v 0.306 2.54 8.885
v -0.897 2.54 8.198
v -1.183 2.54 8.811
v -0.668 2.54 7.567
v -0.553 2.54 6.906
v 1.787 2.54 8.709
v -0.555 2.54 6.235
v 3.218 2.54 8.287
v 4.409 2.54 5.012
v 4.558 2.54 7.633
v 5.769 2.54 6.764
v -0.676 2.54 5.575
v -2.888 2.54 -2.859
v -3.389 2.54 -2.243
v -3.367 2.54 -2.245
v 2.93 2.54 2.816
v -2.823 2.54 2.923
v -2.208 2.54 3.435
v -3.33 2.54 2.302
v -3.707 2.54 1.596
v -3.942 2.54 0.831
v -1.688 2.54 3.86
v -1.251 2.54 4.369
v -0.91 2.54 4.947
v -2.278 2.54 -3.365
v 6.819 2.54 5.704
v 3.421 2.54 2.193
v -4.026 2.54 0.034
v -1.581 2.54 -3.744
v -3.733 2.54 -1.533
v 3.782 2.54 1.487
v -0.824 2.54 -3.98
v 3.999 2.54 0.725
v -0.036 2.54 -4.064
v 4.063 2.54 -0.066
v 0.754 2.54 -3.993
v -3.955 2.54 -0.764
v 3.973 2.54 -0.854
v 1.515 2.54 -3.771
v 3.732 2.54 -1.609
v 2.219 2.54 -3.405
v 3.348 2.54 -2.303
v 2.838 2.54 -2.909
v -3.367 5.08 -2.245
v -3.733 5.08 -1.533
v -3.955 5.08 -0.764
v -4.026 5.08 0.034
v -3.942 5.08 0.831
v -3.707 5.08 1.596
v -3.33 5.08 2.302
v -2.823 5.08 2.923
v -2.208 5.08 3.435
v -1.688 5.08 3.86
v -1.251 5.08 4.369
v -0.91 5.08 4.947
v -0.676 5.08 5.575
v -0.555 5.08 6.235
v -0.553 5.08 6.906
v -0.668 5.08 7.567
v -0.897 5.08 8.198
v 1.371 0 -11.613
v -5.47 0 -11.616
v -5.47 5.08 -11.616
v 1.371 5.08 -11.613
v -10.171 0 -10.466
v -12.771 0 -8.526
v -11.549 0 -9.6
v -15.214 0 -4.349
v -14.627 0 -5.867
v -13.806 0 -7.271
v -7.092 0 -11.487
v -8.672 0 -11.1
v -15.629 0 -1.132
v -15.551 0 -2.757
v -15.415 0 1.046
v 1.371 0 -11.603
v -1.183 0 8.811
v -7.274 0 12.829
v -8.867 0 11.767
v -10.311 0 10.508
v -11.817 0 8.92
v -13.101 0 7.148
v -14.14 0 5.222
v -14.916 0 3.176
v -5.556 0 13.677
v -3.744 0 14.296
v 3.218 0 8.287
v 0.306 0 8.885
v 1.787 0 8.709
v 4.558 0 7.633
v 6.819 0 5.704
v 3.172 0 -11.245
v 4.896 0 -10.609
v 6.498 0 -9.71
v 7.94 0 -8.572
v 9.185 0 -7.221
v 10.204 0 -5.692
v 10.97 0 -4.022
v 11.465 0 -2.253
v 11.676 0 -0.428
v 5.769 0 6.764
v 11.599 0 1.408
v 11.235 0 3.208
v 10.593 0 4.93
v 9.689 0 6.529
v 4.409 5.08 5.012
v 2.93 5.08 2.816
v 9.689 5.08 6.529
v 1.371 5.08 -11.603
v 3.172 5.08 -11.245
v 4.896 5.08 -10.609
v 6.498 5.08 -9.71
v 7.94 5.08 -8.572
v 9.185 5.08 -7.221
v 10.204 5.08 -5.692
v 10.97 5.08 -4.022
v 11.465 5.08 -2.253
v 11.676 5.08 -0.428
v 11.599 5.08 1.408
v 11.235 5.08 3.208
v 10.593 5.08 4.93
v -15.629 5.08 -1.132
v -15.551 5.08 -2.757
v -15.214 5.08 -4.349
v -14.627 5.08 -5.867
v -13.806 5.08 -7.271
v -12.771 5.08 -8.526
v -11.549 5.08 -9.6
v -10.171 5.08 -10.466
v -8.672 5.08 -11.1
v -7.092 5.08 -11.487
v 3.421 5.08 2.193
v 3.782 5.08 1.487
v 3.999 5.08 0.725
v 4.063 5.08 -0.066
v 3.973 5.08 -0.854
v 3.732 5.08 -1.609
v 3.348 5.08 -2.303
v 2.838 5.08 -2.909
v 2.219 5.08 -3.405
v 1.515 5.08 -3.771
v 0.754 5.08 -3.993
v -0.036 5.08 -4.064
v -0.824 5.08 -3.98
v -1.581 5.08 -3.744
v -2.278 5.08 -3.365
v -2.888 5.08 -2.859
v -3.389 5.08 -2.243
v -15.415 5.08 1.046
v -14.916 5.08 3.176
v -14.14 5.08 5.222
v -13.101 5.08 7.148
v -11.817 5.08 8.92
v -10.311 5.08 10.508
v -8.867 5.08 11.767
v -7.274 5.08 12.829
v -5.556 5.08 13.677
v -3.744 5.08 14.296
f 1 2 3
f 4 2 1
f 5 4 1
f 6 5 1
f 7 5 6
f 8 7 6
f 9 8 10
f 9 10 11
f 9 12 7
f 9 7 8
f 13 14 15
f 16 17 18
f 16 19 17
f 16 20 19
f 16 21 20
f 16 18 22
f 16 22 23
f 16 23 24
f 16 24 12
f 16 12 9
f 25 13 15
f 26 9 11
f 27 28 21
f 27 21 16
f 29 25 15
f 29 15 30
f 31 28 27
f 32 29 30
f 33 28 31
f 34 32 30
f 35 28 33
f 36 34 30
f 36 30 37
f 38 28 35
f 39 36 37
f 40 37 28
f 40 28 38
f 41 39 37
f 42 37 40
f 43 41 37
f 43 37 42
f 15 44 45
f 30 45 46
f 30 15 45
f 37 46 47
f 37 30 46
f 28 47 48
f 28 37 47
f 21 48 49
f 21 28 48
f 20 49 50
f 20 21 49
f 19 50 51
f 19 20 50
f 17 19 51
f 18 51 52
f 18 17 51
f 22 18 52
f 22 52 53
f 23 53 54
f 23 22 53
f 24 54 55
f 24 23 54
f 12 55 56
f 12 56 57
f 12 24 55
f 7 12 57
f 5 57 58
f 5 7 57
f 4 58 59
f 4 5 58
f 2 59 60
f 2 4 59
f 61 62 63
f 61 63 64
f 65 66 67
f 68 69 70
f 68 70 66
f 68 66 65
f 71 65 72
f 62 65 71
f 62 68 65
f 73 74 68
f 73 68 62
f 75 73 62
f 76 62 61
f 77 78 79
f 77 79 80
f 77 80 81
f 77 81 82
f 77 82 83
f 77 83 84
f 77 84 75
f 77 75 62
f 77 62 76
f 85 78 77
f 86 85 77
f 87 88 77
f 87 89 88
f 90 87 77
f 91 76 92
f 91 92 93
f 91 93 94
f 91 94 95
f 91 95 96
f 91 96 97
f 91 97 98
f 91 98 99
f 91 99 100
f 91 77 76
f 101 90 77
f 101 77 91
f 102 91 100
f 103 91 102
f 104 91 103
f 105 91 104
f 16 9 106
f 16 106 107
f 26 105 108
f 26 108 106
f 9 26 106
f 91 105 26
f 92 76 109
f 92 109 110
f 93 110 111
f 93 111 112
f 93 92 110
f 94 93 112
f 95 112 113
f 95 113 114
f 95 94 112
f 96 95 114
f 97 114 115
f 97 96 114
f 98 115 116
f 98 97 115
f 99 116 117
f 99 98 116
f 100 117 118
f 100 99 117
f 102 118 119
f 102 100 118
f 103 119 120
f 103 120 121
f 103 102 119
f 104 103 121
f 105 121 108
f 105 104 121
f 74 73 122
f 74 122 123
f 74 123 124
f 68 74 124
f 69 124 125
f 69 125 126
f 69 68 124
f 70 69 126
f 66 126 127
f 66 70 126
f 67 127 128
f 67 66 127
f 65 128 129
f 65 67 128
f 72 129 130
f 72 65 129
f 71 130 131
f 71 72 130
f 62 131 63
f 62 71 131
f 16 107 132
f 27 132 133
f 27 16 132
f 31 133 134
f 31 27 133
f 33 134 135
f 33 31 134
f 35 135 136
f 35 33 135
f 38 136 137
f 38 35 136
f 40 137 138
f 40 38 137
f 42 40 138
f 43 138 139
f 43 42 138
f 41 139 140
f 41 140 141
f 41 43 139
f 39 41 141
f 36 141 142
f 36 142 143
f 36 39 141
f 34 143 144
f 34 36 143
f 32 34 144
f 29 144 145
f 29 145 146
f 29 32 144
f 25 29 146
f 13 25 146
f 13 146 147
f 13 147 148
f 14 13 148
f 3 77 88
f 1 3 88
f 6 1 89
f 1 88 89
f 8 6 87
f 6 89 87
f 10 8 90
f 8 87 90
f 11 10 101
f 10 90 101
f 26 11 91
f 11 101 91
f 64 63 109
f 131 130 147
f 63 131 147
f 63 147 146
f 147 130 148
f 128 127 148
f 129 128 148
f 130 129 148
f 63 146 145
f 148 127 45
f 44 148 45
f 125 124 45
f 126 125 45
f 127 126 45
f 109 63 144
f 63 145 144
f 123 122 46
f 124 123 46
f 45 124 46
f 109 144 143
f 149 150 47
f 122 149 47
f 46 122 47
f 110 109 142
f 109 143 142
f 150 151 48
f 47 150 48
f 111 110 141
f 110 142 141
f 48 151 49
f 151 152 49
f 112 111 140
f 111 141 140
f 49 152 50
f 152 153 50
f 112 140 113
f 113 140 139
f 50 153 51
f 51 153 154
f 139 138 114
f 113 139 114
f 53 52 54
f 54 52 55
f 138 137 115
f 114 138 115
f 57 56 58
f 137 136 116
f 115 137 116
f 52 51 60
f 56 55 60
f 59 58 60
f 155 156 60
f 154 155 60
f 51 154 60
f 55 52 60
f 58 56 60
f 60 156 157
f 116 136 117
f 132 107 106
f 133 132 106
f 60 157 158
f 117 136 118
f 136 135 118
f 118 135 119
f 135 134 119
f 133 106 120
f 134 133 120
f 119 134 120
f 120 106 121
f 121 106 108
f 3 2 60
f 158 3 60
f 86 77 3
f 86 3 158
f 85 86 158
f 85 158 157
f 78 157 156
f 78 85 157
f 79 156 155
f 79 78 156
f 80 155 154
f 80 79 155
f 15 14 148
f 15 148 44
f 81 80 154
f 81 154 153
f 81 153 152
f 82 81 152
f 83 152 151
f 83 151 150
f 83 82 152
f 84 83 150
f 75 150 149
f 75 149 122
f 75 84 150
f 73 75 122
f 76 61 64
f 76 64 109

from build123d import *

# Parameters (mm, degrees)
SKETCH1_R           = 8.89
BOSS_EXTRUDE1_DEPTH = 2.54
BOSS_EXTRUDE2_DEPTH = 5.08


with BuildPart() as part:
    # Sketch1 → Boss-Extrude1 (new body)
    with BuildSketch(Plane(origin=(0, 0, 0), x_dir=(1, 0, 0), z_dir=(0, 1, 0))):
        Circle(SKETCH1_R)
    extrude(amount=BOSS_EXTRUDE1_DEPTH)

    # Sketch2 → Boss-Extrude2 (add)
    with BuildSketch(Plane.XZ):
        with BuildLine():
            Line((-5.470156896, -11.616175324), (1.370506729, -11.61329797))
            Line((1.370506729, -11.61329797), (1.370502542, -11.603343431))
            ThreePointArc((1.370502542, -11.603343431), (10.619701794, -4.872144272), (9.689428275, 6.529229334))
            Line((9.689428275, 6.529229334), (4.409313475, 5.011855517))
            Line((4.409313475, 5.011855517), (2.930122665, 2.816110291))
            ThreePointArc((2.930122665, 2.816110291), (2.540155429, -3.172334534), (-3.388651254, -2.243465774))
            Line((-3.388651254, -2.243465774), (-3.366867699, -2.245362356))
            ThreePointArc((-3.366867699, -2.245362356), (-3.942300227, 0.830594917), (-2.207502202, 3.435035653))
            ThreePointArc((-2.207502202, 3.435035653), (-0.675671449, 5.575210871), (-0.89674169, 8.197801836))
            Line((-0.89674169, 8.197801836), (-3.743562754, 14.29613097))
            ThreePointArc((-3.743562754, 14.29613097), (-7.273662922, 12.829288696), (-10.310746752, 10.507790201))
            ThreePointArc((-10.310746752, 10.507790201), (-14.139706345, 5.222375996), (-15.629256563, -1.131974878))
            ThreePointArc((-15.629256563, -1.131974878), (-12.770870955, -8.526364048), (-5.470156896, -11.616175324))
        make_face()
    extrude(amount=-BOSS_EXTRUDE2_DEPTH)


solid = part.part
